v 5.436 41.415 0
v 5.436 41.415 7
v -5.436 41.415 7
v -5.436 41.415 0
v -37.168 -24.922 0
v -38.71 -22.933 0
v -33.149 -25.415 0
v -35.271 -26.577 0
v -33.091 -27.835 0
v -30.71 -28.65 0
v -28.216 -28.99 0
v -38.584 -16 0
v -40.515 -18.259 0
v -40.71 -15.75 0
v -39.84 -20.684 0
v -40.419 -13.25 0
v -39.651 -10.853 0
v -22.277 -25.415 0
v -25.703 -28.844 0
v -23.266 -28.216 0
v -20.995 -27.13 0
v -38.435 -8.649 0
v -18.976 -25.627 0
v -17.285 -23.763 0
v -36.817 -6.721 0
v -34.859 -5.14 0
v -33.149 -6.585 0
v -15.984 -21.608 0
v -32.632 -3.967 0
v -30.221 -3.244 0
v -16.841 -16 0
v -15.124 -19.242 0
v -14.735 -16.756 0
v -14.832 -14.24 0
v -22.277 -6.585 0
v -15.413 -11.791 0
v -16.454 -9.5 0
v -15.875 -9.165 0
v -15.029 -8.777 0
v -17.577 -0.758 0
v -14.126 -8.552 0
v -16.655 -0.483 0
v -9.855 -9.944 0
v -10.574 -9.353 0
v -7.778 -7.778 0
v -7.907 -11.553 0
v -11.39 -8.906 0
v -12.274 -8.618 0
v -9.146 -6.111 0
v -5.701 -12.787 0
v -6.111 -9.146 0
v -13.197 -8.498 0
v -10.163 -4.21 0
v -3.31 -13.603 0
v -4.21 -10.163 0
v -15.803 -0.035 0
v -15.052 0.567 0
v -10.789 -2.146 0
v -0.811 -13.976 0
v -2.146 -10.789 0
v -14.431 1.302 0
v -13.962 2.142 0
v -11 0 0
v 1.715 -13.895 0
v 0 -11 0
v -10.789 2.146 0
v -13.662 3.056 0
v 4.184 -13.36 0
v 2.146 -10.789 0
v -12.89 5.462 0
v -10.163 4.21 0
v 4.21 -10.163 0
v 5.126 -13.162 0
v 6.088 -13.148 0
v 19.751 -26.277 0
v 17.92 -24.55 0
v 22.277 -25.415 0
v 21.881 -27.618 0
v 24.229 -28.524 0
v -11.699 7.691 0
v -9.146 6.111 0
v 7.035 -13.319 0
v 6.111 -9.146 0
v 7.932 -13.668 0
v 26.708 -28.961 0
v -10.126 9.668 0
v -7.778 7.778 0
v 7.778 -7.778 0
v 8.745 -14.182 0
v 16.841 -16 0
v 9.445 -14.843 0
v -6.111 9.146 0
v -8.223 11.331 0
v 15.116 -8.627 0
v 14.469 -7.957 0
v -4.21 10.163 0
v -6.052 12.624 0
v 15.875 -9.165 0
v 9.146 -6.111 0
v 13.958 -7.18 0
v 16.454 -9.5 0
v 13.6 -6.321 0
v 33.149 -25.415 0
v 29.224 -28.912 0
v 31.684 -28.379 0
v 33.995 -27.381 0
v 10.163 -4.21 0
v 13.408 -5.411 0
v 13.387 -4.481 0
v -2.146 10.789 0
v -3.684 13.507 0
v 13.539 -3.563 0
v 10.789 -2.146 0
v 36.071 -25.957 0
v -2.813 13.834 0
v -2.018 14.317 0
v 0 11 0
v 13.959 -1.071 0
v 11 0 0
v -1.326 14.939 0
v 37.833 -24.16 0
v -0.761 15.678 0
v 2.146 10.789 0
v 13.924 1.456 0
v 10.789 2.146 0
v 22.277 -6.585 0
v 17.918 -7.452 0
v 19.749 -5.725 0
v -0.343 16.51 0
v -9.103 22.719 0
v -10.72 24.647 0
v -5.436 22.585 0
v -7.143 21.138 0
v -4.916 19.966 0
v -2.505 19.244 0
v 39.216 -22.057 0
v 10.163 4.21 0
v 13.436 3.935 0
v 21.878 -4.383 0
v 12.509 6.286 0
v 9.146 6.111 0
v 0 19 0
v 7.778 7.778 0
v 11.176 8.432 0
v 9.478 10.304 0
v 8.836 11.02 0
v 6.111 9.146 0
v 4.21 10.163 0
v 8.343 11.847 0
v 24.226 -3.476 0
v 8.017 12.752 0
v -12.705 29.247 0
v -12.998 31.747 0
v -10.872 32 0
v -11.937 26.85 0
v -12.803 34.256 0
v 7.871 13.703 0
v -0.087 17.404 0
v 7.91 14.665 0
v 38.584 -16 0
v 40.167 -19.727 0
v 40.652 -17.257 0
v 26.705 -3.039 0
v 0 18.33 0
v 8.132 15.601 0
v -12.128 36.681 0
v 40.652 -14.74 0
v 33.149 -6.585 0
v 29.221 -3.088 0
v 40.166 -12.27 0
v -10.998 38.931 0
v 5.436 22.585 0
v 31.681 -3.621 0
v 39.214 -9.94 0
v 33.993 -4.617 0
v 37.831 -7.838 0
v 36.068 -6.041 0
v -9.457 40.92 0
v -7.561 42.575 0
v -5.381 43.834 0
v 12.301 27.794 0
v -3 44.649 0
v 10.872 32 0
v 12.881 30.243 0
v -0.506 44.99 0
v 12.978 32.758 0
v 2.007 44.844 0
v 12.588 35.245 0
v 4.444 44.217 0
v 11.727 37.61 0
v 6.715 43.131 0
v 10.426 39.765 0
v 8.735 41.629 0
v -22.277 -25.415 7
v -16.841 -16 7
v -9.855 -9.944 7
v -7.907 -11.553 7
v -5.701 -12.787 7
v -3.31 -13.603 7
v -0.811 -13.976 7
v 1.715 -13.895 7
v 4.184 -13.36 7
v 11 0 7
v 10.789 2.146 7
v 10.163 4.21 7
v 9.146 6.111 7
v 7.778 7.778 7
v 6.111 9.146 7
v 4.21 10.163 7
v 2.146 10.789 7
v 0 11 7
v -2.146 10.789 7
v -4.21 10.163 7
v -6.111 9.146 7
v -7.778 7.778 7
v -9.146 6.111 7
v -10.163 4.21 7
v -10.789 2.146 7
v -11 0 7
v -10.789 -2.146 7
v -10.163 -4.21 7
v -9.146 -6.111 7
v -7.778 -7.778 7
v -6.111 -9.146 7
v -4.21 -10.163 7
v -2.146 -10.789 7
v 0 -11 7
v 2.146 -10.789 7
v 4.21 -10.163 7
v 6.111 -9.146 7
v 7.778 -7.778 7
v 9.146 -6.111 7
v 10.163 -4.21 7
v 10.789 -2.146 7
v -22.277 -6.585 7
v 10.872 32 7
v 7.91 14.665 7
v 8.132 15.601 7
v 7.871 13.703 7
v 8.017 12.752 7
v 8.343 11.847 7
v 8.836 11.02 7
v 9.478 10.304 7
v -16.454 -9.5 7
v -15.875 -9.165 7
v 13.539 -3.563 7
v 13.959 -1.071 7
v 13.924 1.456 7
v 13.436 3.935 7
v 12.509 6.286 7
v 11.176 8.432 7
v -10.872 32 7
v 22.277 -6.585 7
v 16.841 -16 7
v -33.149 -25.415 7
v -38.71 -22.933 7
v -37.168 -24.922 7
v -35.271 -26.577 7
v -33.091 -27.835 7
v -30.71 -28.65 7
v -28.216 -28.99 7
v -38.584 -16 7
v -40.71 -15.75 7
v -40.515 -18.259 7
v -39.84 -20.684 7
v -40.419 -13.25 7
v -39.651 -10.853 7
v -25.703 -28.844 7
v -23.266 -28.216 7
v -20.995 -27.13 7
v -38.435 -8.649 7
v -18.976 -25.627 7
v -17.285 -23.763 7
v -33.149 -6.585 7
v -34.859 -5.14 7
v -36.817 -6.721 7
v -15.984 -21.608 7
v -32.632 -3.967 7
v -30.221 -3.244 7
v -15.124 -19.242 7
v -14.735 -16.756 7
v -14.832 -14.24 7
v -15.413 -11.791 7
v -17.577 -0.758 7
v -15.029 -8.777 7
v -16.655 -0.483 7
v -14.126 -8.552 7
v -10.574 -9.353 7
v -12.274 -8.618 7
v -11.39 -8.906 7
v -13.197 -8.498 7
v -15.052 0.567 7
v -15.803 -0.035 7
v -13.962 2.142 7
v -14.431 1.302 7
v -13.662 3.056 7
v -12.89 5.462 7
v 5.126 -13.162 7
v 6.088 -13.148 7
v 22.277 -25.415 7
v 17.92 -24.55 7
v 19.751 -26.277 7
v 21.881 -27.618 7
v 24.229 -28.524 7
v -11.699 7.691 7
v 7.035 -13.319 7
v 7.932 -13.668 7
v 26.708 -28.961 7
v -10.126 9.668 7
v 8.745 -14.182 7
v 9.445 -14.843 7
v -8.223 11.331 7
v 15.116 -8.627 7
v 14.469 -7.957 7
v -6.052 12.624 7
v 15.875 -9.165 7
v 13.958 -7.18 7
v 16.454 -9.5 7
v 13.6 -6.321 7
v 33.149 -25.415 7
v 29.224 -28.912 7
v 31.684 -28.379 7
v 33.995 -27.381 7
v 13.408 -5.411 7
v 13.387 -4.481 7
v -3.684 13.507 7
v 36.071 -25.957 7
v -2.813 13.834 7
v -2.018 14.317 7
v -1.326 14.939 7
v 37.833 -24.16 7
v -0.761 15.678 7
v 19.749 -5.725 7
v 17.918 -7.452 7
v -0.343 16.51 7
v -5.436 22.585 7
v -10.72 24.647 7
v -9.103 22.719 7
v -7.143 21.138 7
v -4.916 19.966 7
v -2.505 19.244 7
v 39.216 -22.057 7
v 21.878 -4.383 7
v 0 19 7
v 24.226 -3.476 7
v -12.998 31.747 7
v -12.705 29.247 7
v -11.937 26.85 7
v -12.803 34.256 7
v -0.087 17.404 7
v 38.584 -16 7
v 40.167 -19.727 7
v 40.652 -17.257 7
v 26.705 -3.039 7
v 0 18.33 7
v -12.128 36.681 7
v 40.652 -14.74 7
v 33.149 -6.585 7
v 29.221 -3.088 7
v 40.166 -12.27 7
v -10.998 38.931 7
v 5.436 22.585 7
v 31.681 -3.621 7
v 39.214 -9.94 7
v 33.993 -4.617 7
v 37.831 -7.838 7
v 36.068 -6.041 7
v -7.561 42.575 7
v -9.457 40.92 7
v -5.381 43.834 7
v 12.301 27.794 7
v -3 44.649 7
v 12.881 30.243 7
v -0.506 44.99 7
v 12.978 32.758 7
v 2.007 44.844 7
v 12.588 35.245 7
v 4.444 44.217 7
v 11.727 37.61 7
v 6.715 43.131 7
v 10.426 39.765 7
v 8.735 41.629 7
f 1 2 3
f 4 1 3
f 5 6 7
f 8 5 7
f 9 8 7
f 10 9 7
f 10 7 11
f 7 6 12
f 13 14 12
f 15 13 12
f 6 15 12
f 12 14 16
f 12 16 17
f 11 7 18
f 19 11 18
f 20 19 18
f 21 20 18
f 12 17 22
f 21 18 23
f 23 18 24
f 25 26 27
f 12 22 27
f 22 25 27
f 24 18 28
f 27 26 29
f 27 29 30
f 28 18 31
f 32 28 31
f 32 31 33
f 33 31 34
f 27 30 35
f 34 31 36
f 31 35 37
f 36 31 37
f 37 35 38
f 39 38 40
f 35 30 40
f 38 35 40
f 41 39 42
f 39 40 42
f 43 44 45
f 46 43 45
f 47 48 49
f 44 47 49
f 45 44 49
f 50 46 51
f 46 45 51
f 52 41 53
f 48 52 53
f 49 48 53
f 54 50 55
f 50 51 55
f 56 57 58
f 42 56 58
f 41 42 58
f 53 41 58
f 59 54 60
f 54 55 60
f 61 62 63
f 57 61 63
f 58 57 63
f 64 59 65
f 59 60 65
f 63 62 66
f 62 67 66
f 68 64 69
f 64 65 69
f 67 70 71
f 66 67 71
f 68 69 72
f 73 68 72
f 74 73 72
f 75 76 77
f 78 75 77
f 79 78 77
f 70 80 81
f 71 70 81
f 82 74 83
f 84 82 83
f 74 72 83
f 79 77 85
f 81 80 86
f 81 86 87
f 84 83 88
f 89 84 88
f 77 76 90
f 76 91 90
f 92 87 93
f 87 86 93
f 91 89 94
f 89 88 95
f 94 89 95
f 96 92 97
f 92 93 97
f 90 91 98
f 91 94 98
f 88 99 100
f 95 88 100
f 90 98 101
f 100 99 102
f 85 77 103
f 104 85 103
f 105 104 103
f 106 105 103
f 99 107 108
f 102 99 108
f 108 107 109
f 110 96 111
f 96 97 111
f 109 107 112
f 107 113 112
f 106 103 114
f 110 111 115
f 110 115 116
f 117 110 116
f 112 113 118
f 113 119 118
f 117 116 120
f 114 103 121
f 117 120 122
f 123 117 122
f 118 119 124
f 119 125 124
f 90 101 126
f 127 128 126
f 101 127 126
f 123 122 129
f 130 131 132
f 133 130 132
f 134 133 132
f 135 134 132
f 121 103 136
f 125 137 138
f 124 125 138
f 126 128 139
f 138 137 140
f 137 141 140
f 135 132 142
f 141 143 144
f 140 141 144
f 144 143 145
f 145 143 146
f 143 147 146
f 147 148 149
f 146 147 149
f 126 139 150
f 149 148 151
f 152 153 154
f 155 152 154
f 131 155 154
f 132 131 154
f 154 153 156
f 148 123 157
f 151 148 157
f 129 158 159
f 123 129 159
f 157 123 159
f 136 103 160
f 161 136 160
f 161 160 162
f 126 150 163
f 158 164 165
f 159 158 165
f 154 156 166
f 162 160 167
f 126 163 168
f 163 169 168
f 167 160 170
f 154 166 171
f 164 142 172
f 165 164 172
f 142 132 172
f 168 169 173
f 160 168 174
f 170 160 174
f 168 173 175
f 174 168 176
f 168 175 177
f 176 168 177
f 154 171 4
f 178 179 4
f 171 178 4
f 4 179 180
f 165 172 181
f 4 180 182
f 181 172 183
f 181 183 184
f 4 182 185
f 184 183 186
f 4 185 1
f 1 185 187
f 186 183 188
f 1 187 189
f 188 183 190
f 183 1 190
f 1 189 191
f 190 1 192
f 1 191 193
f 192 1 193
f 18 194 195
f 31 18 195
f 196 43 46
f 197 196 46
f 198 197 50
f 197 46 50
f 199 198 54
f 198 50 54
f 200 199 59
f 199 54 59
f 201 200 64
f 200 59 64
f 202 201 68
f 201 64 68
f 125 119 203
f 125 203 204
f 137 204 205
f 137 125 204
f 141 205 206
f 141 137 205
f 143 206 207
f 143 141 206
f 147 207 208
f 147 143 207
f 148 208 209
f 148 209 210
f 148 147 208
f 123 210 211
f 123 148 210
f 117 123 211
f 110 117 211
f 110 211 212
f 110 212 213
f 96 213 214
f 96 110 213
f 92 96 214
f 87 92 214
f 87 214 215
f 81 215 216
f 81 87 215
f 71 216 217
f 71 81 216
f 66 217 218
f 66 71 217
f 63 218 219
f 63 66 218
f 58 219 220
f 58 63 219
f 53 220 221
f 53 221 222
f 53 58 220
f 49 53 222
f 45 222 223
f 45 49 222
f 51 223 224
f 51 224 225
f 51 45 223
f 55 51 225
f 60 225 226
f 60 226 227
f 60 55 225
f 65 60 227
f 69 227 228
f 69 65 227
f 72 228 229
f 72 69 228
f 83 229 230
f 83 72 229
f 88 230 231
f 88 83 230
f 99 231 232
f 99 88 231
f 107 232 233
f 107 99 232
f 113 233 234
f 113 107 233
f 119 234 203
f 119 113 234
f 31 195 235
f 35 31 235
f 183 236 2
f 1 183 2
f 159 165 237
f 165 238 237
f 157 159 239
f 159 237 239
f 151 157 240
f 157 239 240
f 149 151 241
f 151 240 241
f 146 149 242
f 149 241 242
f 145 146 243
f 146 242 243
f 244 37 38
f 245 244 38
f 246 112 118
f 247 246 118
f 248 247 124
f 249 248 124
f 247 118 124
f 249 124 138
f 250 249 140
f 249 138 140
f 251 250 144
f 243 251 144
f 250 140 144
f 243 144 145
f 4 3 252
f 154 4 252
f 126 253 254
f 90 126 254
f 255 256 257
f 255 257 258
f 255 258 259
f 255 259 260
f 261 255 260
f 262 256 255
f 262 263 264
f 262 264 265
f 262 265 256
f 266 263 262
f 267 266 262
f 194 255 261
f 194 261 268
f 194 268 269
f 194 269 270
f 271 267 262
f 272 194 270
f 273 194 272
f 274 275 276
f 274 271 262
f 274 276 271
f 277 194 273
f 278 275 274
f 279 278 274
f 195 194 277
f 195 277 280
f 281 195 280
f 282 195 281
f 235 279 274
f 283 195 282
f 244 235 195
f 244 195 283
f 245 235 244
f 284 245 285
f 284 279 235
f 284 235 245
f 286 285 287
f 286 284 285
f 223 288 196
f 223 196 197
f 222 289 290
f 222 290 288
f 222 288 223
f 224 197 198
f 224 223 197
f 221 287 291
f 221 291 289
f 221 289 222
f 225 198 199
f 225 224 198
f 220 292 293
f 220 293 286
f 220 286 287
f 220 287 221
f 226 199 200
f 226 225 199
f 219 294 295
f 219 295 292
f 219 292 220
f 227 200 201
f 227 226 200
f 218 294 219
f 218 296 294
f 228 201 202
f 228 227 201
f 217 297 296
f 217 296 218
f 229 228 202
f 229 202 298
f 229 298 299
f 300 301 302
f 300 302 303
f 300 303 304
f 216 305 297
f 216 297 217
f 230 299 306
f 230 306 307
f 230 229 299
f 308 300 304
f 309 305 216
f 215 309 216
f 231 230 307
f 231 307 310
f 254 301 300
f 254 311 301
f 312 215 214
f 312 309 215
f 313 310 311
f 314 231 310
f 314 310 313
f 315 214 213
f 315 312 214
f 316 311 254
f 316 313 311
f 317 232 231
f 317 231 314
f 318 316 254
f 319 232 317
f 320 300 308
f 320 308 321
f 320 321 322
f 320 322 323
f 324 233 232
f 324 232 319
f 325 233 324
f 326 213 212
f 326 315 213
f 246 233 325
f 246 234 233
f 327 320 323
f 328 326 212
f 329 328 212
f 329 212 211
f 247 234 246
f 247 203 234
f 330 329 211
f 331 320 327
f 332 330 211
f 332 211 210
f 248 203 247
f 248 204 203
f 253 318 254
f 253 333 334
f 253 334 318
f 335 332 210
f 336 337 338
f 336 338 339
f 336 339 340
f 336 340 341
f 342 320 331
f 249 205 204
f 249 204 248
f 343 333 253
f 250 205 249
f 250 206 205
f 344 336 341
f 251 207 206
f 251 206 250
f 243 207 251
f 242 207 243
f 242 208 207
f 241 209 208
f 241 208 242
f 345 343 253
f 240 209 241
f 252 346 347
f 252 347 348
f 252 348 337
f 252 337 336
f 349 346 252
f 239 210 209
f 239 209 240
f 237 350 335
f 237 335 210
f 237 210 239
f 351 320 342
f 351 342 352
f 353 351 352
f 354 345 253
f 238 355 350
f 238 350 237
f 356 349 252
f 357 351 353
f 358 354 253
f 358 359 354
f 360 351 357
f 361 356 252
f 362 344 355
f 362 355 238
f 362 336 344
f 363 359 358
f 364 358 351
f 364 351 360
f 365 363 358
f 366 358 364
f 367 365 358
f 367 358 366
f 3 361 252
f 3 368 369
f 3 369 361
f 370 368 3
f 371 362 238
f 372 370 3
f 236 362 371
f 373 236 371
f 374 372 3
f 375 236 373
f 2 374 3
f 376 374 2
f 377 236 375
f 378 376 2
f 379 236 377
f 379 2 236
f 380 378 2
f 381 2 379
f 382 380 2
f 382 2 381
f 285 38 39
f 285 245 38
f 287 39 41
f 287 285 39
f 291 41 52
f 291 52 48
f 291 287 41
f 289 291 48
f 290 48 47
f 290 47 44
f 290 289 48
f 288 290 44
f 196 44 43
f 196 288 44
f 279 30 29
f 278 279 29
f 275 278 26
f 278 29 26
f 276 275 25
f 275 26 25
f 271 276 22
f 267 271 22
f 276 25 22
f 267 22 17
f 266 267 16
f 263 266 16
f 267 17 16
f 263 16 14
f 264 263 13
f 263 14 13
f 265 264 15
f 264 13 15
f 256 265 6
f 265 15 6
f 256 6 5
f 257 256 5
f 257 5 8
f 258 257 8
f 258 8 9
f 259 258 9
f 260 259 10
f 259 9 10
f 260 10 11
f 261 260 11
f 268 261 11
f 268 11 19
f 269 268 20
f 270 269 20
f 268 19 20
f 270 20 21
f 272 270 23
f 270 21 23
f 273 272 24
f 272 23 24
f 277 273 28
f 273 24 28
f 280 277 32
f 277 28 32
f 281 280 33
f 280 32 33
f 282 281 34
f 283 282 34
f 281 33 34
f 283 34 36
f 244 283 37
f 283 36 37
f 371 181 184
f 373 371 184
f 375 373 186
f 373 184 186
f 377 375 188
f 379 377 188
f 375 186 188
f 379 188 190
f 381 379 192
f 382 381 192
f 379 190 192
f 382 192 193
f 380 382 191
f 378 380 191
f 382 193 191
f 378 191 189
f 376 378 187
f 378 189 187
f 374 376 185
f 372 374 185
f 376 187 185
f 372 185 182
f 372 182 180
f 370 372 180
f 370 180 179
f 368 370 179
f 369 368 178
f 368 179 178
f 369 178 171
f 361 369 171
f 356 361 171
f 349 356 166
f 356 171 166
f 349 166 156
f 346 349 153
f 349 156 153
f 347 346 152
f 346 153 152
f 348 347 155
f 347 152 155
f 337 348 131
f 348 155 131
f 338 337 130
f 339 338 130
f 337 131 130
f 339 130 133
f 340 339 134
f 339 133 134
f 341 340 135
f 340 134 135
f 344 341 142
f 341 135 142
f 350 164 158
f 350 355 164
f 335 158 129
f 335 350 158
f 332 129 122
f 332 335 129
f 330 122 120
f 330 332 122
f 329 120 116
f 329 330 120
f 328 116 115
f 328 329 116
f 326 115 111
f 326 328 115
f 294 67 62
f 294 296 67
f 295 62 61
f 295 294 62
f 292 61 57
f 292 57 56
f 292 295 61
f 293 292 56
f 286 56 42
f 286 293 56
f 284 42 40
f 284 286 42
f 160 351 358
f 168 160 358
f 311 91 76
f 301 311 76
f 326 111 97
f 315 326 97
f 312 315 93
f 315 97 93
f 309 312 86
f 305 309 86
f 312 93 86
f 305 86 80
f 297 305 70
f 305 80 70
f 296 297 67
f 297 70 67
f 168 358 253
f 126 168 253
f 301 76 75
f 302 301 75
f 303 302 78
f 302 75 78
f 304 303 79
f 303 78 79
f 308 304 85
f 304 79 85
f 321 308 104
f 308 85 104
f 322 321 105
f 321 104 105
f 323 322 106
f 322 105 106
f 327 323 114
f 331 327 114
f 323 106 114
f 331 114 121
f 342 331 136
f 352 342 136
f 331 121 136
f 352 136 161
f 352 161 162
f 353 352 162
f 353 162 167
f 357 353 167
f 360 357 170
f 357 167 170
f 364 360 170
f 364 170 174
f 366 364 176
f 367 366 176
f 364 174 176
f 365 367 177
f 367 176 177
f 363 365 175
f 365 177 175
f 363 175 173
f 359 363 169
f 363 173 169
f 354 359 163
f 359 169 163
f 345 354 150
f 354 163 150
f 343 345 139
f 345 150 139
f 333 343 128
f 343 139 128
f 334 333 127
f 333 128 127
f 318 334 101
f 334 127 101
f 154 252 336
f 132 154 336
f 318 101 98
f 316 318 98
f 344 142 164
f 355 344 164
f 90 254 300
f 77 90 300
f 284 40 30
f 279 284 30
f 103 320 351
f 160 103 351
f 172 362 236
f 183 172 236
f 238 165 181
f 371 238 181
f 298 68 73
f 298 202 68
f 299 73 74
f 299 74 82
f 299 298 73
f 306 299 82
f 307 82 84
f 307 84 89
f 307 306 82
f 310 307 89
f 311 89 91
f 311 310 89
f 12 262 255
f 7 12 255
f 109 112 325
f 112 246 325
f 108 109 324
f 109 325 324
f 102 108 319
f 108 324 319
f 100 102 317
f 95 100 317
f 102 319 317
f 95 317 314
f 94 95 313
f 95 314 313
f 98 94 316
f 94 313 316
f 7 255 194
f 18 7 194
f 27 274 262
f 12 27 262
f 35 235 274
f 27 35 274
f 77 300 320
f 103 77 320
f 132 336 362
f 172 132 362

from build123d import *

# Parameters (mm, degrees)
F0_R     = 11
F1_DEPTH = 7
F3_DEPTH = 25
F4_R     = 5


with BuildPart() as f1:
    # F0 (on Top) → F1 (new body)
    with BuildSketch(Plane.XY):
        with BuildLine():
            Line((0, 19), (0, 14))
            ThreePointArc((0, 14), (-9.918883, 9.880068), (-13.999892, -0.054893))
            ThreePointArc((-13.999892, -0.054893), (-13.515832, -3.649971), (-12.124356, -7))
            ThreePointArc((-12.124356, -7), (-3.596948, -13.530039), (7.047485, -12.096816))
            ThreePointArc((7.047485, -12.096816), (9.918883, -9.880068), (12.124356, -7))
            ThreePointArc((12.124356, -7), (13.515832, 3.649971), (6.952408, 12.151709))
            Line((6.952408, 12.151709), (12.300835, 27.794118))
            ThreePointArc((12.300835, 27.794118), (-7.56054, 42.57536), (0, 19))
        make_face()
        Circle(F0_R, mode=Mode.SUBTRACT)
        with BuildLine():
            ThreePointArc((12.124356, -7), (9.918883, -9.880068), (7.047485, -12.096816))
            Line((7.047485, -12.096816), (17.919994, -24.549895))
            ThreePointArc((17.919994, -24.549895), (40.651613, -14.74006), (16.454483, -9.5))
            Line((16.454483, -9.5), (12.124356, -7))
        make_face()
        with BuildLine():
            ThreePointArc((-12.124356, -7), (-13.515832, -3.649971), (-13.999892, -0.054893))
            Line((-13.999892, -0.054893), (-30.22083, -3.244223))
            ThreePointArc((-30.22083, -3.244223), (-33.091073, -27.8353), (-16.454483, -9.5))
            Line((-16.454483, -9.5), (-12.124356, -7))
        make_face()
    extrude(amount=F1_DEPTH)

    # F2 (on face) → F3 (cut)
    with BuildSketch(Plane.XY.offset(7)):
        Polygon((5.435753, 41.415), (-5.435753, 41.415), (-10.871506, 32), (-5.435753, 22.585), (5.435753, 22.585), (10.871506, 32), align=None)
        Polygon((16.841307, -16), (22.27706, -25.415), (33.148566, -25.415), (38.584318, -16), (33.148566, -6.585), (22.27706, -6.585), align=None)
        Polygon((-22.27706, -6.585), (-33.148566, -6.585), (-38.584318, -16), (-33.148566, -25.415), (-22.27706, -25.415), (-16.841307, -16), align=None)
    extrude(amount=-F3_DEPTH, mode=Mode.SUBTRACT)

    # F4
    f4_edges = [f1.edges().sort_by_distance(p)[0] for p in [
        (6.952408, 12.151709, 3.5),
        (12.124356, -7, 3.5),
        (7.047485, -12.096816, 3.5),
        (-12.124356, -7, 3.5),
        (-13.999892, -0.054893, 3.5),
        (0, 14, 3.5),
    ]]
    fillet(f4_edges, radius=F4_R)


solid = f1.part
